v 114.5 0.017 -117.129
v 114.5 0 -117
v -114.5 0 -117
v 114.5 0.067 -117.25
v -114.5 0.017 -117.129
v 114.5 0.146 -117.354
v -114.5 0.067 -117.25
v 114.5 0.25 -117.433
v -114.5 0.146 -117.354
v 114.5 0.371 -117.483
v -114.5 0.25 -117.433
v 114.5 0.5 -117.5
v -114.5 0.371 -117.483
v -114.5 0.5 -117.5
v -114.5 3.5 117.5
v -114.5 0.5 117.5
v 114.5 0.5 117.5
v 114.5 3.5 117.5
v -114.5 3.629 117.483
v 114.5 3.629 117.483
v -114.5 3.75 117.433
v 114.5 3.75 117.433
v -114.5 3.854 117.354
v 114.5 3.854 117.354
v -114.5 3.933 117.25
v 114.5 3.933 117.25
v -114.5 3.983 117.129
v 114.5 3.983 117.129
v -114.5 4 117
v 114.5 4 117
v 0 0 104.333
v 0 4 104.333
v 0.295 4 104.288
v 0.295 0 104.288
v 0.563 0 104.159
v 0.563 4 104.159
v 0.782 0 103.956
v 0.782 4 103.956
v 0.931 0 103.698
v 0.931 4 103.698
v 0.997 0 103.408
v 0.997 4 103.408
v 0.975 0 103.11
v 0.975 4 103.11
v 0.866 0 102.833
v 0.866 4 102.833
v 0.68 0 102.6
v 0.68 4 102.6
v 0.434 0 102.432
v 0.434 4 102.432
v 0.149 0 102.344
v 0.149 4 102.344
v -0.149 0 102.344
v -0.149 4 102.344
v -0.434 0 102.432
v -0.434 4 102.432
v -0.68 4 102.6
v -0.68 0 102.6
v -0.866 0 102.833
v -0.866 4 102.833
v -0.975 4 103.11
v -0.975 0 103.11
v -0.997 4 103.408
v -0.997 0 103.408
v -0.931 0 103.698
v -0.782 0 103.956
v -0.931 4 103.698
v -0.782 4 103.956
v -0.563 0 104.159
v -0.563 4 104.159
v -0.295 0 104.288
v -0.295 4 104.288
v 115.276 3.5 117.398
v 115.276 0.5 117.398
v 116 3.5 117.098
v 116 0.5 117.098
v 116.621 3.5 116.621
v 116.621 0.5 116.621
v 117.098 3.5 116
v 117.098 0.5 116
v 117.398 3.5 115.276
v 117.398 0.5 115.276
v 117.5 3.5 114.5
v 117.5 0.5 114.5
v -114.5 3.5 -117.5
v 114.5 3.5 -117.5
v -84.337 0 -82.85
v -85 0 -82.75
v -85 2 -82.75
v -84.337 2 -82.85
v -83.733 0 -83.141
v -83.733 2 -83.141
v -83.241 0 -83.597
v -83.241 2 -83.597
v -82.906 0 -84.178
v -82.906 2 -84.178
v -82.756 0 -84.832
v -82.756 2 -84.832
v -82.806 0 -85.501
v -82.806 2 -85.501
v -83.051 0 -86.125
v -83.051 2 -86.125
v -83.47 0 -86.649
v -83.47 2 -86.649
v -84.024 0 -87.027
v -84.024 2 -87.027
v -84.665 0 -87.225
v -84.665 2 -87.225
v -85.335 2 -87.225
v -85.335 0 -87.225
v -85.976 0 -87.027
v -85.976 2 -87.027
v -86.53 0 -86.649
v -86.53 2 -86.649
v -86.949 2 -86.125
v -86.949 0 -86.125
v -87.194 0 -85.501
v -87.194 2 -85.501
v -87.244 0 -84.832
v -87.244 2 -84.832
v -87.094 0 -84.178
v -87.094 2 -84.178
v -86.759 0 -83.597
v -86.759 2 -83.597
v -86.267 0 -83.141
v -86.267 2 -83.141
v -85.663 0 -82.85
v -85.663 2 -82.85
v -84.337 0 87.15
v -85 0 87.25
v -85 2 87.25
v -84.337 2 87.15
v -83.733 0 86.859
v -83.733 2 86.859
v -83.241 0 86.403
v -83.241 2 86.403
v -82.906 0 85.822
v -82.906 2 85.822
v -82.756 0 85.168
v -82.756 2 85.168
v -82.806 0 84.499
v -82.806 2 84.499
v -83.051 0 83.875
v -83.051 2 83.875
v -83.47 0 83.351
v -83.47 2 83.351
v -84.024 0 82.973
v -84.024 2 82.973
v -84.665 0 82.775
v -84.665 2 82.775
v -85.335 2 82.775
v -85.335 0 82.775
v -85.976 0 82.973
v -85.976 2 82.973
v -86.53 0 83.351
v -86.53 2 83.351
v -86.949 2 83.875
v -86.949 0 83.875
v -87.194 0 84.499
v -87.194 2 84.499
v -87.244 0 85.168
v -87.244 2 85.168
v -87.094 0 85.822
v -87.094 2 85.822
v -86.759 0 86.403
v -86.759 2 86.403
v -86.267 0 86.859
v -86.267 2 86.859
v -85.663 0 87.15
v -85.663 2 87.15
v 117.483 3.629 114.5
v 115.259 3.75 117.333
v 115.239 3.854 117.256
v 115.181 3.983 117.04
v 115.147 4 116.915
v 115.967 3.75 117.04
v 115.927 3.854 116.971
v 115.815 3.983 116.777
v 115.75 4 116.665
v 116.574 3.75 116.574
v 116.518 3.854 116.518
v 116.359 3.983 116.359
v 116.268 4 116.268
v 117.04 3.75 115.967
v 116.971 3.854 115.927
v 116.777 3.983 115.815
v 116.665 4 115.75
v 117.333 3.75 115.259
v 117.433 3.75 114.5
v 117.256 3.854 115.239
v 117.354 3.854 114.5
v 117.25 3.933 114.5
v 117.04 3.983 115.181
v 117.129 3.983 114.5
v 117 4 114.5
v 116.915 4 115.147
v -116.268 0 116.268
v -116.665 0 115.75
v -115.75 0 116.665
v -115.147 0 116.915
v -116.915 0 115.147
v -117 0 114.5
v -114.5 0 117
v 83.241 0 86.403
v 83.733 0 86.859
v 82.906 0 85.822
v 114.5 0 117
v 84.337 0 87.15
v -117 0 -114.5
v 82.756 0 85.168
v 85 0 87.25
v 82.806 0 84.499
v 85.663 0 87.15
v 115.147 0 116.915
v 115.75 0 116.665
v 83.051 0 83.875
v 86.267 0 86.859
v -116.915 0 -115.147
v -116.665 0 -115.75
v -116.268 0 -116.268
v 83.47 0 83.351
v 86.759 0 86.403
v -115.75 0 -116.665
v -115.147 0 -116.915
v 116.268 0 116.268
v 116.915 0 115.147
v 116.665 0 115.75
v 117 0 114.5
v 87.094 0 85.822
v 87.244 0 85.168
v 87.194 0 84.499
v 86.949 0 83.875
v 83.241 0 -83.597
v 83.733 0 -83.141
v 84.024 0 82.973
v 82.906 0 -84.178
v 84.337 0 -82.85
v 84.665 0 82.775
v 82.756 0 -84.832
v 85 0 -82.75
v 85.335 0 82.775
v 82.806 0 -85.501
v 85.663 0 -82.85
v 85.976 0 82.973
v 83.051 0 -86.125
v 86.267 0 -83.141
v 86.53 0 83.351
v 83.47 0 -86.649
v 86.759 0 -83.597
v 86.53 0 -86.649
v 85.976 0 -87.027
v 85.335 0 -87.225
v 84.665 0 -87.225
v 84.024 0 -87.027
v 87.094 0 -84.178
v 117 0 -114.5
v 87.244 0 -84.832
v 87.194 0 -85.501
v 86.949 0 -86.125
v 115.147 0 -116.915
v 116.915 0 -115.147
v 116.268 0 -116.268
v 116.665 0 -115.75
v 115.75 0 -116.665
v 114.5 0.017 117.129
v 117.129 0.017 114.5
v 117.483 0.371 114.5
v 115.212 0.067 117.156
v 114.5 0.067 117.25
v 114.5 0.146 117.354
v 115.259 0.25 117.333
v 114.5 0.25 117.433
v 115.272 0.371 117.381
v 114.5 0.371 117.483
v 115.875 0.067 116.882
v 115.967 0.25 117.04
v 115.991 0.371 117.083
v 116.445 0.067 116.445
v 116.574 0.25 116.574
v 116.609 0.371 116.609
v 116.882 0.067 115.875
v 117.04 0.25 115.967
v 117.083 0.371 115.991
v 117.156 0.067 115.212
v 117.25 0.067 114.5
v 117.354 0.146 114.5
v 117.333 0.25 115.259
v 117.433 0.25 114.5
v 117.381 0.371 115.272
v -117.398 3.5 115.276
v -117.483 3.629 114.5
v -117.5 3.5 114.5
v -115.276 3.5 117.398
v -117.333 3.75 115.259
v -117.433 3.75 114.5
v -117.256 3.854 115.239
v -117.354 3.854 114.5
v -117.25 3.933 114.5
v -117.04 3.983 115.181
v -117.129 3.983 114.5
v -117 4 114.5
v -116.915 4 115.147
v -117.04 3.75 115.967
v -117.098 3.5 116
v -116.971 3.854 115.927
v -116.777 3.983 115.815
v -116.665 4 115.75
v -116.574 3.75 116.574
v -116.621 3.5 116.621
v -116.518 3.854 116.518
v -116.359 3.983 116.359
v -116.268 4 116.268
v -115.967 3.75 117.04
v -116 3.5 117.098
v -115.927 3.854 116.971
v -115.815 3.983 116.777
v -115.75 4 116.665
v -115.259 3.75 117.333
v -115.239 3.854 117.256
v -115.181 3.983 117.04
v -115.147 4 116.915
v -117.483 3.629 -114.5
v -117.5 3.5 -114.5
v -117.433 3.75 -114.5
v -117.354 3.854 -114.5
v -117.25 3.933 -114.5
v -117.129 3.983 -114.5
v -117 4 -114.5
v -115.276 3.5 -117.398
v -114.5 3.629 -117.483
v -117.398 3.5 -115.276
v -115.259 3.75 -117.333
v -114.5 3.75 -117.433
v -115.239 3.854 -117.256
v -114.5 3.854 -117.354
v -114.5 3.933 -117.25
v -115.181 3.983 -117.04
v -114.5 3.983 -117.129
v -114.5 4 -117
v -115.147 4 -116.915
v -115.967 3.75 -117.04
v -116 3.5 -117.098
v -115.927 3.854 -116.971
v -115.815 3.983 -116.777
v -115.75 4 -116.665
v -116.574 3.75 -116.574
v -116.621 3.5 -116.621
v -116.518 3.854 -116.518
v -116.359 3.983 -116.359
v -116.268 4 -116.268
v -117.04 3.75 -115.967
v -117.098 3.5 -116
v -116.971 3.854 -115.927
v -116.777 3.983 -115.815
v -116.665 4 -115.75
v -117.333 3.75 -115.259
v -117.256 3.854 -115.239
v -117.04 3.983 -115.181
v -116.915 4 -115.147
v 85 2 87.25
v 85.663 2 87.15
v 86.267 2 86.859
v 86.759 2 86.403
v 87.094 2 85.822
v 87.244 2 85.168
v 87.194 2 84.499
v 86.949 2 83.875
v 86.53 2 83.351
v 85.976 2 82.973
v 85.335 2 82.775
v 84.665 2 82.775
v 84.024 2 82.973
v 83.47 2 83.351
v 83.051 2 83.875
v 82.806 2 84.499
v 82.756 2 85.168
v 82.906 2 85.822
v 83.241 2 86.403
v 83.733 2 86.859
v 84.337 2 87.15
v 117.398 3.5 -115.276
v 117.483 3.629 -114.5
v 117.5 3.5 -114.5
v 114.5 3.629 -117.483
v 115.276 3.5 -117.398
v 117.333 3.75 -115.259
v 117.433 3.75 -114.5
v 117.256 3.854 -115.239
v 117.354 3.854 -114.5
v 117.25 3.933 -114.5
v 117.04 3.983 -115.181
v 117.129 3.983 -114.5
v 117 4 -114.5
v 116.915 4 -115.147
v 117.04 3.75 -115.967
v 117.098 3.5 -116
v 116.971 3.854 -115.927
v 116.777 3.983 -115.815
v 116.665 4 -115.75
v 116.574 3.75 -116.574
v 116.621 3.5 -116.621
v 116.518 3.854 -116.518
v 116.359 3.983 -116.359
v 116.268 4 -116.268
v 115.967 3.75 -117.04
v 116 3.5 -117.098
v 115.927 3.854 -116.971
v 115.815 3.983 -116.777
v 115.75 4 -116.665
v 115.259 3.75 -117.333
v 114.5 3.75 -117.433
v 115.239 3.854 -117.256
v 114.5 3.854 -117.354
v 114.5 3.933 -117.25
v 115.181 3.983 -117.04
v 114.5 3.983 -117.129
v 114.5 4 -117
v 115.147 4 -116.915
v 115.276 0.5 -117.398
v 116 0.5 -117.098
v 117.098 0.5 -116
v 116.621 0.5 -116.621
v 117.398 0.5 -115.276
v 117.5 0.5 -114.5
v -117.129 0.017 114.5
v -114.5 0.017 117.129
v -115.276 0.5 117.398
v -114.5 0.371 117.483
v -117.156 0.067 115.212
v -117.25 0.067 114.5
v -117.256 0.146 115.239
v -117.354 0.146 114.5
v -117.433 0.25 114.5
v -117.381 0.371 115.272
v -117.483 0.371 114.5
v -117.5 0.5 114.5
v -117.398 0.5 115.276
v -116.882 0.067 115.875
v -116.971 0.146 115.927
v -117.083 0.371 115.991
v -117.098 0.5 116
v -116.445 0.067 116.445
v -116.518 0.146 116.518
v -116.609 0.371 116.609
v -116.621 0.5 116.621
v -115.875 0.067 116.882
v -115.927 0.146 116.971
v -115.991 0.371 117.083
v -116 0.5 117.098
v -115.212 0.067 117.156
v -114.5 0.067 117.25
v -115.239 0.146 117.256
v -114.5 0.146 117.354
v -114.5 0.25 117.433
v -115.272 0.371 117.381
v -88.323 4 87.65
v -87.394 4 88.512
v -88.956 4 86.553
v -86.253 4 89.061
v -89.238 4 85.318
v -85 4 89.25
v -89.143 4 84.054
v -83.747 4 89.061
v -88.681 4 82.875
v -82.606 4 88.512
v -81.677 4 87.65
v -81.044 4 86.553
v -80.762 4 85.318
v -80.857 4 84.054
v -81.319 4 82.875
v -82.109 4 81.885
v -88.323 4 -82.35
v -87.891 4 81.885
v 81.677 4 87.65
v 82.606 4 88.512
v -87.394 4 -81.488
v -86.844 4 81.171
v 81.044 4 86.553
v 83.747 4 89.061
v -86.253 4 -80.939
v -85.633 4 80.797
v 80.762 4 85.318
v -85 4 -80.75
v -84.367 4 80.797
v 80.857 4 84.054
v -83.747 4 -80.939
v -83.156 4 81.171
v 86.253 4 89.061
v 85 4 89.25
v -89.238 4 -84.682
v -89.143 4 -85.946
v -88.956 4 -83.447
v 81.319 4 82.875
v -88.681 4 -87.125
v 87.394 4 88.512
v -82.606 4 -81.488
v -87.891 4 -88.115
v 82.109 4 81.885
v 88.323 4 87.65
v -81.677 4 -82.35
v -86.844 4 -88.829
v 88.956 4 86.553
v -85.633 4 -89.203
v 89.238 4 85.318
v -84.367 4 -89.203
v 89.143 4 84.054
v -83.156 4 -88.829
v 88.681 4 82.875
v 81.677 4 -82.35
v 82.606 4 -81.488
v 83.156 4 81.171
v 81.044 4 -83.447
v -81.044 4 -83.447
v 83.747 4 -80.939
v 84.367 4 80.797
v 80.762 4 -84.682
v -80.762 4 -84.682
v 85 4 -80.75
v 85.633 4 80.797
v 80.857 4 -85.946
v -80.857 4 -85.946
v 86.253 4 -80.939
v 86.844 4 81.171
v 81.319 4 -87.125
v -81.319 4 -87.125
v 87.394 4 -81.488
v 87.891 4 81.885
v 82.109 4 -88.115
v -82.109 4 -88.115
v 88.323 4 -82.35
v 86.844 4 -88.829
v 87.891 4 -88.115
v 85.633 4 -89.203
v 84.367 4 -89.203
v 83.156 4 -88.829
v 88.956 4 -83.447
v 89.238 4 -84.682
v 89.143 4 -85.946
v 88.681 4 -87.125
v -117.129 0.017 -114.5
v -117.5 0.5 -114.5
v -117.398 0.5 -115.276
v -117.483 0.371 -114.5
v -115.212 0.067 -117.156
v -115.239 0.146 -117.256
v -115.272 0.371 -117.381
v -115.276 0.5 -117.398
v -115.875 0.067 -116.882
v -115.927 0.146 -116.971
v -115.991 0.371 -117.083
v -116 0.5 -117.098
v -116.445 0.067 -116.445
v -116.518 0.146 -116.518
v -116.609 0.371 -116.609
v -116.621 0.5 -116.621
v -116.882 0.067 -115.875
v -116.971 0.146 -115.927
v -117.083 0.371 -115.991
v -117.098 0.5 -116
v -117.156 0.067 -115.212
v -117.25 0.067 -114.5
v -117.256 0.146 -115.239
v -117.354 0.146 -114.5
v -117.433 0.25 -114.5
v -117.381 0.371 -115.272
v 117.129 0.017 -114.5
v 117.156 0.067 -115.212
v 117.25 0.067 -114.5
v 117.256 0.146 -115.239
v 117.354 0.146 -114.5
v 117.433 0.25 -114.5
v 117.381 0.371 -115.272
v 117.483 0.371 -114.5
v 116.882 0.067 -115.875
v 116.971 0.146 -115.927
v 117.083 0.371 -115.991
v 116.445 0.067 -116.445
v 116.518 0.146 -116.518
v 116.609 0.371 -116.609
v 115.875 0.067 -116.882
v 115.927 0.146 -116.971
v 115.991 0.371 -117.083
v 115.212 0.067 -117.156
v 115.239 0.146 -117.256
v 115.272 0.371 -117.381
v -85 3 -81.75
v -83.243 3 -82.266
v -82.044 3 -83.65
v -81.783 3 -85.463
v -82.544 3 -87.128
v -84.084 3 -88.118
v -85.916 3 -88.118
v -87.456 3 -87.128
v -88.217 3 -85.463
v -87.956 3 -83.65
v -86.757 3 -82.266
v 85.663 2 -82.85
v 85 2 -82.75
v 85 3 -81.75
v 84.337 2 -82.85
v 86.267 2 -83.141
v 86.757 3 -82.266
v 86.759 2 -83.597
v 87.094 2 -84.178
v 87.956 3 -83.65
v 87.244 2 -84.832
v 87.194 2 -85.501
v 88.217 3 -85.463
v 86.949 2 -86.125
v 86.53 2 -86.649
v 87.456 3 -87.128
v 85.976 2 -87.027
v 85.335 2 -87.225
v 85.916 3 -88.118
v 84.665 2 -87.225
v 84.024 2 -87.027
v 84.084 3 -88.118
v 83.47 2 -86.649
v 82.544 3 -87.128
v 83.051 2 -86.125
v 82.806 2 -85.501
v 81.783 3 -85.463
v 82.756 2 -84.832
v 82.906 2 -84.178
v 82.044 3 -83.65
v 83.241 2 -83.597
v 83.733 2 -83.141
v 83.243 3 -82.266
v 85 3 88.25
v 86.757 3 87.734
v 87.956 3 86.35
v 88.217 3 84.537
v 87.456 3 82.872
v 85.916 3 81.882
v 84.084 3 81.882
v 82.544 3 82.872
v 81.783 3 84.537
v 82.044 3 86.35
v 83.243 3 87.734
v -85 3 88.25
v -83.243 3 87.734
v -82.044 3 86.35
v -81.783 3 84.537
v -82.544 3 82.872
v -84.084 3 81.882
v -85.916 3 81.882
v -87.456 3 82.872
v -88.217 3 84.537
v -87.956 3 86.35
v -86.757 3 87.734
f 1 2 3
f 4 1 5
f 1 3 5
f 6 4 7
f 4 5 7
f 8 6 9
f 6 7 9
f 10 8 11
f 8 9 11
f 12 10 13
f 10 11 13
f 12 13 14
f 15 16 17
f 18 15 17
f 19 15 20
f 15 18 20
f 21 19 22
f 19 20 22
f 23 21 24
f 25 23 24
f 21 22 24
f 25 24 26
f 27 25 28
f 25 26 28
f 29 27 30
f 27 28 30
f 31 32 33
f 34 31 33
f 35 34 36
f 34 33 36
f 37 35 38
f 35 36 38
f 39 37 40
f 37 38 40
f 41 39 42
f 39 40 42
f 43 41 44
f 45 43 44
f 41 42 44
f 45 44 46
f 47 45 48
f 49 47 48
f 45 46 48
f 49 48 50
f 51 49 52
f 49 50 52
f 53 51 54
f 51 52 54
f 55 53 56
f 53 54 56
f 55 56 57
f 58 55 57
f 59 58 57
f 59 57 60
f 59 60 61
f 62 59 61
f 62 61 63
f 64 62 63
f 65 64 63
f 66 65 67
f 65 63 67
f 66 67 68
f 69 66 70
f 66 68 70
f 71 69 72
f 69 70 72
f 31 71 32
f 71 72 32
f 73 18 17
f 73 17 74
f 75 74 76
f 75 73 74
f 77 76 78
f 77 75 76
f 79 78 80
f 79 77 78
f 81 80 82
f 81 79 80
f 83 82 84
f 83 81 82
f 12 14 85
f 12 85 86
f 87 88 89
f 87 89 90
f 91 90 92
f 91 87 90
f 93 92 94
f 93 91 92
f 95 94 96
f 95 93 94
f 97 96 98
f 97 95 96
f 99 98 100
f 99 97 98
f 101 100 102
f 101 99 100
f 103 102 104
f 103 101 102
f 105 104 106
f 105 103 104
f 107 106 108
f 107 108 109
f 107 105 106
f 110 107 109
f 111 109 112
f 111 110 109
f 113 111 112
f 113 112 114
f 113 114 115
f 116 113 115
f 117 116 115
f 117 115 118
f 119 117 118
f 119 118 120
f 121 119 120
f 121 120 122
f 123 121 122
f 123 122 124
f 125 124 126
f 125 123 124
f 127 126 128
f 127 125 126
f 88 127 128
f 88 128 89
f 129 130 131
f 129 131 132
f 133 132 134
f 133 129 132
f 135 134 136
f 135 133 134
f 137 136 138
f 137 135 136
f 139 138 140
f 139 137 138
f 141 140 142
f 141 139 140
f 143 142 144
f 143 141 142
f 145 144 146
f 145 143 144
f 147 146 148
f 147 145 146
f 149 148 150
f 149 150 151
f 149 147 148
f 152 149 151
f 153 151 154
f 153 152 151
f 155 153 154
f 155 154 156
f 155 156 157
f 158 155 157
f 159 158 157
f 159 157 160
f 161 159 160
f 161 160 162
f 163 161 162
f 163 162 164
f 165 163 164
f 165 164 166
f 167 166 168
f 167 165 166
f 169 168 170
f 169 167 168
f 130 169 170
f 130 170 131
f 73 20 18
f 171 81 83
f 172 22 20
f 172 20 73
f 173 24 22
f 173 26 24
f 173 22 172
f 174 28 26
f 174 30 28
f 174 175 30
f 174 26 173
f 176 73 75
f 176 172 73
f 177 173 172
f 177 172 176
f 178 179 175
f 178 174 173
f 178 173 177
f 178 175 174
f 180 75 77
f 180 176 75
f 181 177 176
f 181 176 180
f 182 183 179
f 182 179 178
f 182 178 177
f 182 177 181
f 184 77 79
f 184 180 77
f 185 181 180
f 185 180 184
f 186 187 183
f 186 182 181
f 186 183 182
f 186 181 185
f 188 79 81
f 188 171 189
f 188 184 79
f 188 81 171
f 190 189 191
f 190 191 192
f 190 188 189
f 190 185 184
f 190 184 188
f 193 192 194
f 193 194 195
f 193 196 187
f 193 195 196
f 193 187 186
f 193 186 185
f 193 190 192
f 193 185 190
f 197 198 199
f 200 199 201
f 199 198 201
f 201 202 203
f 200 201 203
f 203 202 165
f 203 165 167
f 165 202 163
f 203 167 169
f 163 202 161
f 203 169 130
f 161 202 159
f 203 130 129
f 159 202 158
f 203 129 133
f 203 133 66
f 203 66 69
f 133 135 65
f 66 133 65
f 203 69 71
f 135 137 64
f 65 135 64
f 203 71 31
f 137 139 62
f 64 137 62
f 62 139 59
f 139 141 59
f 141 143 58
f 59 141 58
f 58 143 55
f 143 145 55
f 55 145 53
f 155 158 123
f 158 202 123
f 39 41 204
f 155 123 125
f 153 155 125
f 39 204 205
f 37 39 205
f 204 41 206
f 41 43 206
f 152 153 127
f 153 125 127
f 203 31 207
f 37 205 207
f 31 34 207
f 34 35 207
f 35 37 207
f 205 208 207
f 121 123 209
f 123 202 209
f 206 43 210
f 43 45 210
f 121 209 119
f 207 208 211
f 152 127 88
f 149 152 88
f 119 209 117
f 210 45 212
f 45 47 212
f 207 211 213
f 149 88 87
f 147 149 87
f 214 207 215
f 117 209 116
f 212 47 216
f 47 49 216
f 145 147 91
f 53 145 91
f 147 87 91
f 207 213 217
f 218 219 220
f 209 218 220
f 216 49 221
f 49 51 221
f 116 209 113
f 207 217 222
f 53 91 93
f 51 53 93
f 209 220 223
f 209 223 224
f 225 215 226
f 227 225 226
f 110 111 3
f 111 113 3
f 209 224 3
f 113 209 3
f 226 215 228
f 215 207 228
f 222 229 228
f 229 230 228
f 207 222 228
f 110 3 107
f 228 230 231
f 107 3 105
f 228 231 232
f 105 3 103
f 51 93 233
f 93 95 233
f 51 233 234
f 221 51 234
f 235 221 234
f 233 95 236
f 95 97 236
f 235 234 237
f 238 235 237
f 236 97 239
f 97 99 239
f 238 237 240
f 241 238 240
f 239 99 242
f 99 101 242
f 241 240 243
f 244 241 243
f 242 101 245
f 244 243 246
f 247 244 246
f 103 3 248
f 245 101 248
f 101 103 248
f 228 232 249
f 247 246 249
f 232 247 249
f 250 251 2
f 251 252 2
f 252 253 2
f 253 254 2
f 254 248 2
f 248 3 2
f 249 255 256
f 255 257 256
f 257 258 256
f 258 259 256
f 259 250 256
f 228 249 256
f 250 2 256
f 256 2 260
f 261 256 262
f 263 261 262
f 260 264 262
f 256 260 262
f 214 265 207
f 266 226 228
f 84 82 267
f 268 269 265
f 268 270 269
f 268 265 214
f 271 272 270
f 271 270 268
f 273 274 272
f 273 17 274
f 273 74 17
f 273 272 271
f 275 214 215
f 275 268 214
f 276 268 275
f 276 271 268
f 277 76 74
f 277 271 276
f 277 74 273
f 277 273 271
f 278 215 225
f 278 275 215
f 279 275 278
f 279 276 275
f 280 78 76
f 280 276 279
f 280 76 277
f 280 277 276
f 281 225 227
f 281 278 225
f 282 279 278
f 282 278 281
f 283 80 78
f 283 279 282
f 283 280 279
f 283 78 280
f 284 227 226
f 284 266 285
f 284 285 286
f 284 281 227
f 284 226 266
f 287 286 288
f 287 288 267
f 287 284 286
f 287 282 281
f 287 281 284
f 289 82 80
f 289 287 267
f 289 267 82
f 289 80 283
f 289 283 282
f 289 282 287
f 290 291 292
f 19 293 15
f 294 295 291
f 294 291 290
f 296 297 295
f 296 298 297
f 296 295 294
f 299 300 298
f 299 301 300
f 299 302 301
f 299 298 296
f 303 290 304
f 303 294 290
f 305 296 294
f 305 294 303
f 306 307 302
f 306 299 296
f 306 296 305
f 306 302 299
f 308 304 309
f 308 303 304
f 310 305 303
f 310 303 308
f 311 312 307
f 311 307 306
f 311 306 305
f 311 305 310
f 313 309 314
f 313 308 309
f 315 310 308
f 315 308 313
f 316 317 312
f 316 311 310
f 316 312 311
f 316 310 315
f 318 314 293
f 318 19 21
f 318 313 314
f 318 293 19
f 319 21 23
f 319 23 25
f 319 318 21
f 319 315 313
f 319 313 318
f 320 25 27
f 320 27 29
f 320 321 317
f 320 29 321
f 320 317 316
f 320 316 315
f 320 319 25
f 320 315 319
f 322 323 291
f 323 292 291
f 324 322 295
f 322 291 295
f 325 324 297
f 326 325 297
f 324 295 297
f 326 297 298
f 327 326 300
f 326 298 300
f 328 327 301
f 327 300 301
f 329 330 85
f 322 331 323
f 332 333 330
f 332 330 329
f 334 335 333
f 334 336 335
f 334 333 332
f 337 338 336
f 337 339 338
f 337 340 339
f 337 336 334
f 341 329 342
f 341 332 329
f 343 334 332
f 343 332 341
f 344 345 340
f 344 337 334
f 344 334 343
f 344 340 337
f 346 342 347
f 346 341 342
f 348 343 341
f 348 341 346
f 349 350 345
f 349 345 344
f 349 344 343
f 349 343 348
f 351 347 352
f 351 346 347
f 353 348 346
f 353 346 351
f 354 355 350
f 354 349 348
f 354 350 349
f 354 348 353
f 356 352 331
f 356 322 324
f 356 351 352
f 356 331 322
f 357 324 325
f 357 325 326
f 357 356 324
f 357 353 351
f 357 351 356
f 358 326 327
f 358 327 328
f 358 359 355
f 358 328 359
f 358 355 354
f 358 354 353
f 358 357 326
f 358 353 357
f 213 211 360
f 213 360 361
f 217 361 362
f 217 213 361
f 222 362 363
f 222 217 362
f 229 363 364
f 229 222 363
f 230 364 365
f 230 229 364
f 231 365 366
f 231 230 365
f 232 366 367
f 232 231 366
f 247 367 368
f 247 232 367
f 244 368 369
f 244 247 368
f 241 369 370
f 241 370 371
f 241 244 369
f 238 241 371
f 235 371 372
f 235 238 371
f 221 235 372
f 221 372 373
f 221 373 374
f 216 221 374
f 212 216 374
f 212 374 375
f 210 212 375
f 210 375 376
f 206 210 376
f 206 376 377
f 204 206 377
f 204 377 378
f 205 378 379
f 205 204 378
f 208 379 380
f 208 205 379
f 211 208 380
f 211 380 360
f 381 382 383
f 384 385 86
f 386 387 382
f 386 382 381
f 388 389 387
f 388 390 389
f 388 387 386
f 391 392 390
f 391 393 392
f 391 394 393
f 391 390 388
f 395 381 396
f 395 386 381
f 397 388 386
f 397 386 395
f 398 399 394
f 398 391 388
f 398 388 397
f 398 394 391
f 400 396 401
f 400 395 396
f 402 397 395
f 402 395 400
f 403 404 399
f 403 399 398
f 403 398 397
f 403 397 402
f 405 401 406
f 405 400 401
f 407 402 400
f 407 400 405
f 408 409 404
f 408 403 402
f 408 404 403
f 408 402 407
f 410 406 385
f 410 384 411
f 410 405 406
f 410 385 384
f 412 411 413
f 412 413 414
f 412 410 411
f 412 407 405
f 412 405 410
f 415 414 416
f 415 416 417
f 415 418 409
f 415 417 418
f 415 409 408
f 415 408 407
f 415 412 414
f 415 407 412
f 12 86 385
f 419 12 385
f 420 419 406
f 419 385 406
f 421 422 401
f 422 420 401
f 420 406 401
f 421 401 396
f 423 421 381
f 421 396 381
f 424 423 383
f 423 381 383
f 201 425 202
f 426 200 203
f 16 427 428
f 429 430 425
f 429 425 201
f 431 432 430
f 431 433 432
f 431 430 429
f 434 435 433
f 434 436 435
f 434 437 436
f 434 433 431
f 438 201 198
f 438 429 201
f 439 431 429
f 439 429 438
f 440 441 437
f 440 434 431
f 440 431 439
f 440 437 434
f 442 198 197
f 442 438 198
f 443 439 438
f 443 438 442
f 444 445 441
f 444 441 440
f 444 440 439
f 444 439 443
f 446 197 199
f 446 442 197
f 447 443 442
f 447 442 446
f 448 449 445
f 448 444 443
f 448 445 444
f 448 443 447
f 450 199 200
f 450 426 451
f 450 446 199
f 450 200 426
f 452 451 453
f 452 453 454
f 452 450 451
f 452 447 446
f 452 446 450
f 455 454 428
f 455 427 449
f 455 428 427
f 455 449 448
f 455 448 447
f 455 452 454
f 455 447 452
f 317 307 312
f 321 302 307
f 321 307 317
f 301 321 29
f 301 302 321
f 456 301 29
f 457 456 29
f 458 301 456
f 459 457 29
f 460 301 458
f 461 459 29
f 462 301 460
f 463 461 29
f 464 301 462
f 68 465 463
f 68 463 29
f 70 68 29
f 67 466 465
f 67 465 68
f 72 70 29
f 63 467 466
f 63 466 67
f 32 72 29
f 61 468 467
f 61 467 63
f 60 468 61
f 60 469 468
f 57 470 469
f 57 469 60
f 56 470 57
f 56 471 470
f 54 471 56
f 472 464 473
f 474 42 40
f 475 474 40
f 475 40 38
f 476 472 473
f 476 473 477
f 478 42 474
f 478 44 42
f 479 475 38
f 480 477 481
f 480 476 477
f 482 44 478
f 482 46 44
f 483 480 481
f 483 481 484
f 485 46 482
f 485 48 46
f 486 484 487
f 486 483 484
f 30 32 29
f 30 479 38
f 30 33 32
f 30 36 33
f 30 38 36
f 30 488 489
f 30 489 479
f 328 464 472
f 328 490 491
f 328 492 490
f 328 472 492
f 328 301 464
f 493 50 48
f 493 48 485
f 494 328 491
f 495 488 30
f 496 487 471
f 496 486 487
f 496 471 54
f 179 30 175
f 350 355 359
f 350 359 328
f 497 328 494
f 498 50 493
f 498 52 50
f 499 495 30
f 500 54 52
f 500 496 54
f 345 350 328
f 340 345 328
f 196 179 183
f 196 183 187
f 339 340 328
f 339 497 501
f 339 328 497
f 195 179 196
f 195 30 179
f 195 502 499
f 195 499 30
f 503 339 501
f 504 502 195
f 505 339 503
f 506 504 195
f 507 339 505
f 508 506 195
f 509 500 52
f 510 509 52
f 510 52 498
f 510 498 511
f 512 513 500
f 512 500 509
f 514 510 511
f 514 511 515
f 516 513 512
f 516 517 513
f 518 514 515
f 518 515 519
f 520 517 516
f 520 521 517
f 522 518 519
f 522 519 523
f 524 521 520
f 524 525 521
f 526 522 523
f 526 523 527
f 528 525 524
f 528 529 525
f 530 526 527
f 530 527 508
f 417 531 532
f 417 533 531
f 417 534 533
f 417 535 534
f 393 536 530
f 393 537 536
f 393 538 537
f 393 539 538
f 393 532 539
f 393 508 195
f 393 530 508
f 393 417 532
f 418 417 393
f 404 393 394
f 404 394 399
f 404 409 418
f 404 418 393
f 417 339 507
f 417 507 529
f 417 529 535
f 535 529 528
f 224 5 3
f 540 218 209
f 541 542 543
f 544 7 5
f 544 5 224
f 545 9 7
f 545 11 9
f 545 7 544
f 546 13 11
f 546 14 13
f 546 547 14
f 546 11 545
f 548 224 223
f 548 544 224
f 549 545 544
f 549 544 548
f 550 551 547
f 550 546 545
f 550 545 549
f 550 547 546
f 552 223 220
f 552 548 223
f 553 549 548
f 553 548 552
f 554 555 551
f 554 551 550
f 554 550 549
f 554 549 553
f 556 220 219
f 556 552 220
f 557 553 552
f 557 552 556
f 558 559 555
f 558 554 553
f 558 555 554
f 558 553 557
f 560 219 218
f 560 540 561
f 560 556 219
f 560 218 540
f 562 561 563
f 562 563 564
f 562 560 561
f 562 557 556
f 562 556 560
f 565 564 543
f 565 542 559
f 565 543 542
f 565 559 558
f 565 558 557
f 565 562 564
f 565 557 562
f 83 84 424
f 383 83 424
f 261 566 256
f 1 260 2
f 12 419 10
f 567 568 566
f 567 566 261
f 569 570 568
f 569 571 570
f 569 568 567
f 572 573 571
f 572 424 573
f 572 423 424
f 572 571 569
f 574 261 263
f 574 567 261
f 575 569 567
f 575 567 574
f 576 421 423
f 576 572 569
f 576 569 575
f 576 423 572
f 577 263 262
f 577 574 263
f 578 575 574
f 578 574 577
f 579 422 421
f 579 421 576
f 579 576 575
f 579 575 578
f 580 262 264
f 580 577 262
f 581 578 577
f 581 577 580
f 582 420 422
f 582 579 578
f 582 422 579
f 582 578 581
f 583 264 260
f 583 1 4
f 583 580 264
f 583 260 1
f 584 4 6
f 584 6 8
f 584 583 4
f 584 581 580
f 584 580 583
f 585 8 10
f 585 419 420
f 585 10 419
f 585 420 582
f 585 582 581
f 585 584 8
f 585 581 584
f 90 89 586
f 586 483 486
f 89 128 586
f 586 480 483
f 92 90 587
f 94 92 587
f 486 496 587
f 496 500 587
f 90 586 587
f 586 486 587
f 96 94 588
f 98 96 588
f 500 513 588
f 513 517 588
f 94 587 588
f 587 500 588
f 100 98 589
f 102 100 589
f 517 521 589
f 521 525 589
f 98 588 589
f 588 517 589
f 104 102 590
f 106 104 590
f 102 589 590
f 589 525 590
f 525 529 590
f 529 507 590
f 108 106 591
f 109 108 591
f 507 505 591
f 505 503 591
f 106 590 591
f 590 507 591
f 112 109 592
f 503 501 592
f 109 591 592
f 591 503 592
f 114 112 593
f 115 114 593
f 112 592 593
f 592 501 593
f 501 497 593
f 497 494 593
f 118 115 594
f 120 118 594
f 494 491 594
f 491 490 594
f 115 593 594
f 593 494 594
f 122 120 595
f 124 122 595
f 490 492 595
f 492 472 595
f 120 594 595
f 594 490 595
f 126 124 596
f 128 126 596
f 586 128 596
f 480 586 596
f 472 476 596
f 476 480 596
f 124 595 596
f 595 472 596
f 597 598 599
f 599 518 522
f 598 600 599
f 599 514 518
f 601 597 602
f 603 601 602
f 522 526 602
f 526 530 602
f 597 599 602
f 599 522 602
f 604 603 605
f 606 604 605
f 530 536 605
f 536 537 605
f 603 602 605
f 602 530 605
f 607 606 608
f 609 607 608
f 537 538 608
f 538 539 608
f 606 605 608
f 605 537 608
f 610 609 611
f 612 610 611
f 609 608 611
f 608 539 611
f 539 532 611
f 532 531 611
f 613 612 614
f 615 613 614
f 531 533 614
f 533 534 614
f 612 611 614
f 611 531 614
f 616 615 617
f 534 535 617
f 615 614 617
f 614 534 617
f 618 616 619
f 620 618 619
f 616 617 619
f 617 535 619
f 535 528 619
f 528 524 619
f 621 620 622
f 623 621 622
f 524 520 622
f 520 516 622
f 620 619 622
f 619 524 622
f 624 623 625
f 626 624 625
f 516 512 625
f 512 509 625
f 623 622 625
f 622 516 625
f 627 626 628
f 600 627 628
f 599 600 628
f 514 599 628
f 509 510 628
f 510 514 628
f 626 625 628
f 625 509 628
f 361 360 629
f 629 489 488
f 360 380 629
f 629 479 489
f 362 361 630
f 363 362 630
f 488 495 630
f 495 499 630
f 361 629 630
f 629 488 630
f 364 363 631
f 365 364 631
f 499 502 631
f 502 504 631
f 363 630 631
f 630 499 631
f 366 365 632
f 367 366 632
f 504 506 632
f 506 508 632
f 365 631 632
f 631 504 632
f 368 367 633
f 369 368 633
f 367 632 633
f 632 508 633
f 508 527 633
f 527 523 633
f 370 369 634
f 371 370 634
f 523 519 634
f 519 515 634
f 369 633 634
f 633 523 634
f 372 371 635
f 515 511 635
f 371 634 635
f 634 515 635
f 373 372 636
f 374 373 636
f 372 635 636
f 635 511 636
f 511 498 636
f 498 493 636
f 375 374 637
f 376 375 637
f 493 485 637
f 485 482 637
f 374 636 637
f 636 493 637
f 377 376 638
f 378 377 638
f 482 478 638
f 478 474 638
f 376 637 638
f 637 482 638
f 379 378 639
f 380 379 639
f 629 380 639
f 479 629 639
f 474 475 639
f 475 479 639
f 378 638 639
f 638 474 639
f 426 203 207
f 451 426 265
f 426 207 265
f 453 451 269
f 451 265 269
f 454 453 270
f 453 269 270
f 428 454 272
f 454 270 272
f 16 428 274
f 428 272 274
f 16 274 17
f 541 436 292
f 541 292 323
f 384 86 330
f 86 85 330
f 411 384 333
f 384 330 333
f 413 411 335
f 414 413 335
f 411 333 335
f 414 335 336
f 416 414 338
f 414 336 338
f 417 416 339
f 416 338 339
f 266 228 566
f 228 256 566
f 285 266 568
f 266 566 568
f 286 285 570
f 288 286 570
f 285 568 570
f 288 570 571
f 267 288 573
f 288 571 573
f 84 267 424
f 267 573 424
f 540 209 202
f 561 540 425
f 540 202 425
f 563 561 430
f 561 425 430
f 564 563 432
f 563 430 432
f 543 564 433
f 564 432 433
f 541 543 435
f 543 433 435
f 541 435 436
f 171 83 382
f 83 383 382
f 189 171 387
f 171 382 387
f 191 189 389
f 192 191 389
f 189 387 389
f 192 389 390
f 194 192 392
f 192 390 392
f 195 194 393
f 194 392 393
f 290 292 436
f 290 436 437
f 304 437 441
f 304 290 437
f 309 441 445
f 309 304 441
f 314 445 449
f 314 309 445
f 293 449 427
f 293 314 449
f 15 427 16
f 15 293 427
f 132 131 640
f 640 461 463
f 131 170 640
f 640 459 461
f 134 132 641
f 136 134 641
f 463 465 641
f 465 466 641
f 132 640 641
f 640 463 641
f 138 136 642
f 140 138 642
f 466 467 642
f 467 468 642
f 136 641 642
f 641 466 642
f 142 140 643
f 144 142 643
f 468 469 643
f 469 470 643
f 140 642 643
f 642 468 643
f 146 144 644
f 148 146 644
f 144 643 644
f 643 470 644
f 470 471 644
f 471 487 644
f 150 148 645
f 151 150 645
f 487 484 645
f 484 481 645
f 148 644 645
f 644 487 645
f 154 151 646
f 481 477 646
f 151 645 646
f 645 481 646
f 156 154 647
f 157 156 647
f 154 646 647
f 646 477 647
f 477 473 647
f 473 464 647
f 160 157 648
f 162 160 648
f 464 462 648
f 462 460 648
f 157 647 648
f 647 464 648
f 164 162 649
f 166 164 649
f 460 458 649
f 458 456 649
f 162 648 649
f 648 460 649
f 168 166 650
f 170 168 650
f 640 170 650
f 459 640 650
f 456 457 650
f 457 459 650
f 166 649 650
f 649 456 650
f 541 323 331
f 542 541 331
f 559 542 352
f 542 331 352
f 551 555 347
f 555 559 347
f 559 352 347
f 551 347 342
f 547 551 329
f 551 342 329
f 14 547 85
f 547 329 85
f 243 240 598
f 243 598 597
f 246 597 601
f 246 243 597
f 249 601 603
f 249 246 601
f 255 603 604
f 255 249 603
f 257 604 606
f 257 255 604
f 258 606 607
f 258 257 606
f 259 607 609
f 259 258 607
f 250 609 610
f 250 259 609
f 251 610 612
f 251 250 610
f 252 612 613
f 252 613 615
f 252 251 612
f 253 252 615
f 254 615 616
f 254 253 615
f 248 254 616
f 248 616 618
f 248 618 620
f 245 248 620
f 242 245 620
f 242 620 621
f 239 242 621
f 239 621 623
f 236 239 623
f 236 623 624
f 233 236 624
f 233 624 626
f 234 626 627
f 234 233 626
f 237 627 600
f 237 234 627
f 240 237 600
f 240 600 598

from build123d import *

# Parameters (mm, degrees)
SKETCH1_W           = 235
SKETCH1_H           = 235
SKETCH1_R           = 2.25
BOSS_EXTRUDE1_DEPTH = 4
CHAMFER1_SIZE       = 2
FILLET1_R           = 3
FILLET2_R           = 0.5
SKETCH2_R           = 1
CUT_EXTRUDE1_DEPTH  = 4


with BuildPart() as part:
    # Sketch1 → Boss-Extrude1 (new body)
    with BuildSketch(Plane(origin=(0, 0, 0), x_dir=(1, 0, 0), z_dir=(0, 1, 0))):
        Rectangle(SKETCH1_W, SKETCH1_H)
        with Locations(Location((85, 85, 0), (0, 0, 270))):
            Circle(SKETCH1_R, mode=Mode.SUBTRACT)
        with Locations(Location((-85, 85, 0), (0, 0, 270))):
            Circle(SKETCH1_R, mode=Mode.SUBTRACT)
        with Locations(Location((-85, -85, 0), (0, 0, 270))):
            Circle(SKETCH1_R, mode=Mode.SUBTRACT)
        with Locations(Location((85, -85, 0), (0, 0, 270))):
            Circle(SKETCH1_R, mode=Mode.SUBTRACT)
    extrude(amount=BOSS_EXTRUDE1_DEPTH)

    # Chamfer1
    chamfer1_edges = [part.edges().sort_by_distance(p)[0] for p in [
        (85, 4, -87.25),
        (-85, 4, -87.25),
        (-85, 4, 82.75),
        (85, 4, 82.75),
    ]]
    chamfer(chamfer1_edges, length=CHAMFER1_SIZE)

    # Fillet1
    fillet1_edges = [part.edges().sort_by_distance(p)[0] for p in [
        (117.5, 2, 117.5),
        (-117.5, 2, 117.5),
        (-117.5, 2, -117.5),
        (117.5, 2, -117.5),
    ]]
    fillet(fillet1_edges, radius=FILLET1_R)

    # Fillet2
    fillet2_edges = [part.edges().sort_by_distance(p)[0] for p in [
        (117.5, 0, 0),
        (117.5, 4, 0),
        (0, 0, 117.5),
        (-117.5, 0, 0),
        (0, 0, -117.5),
        (116.621320344, 0, -116.621320344),
        (-116.621320344, 0, -116.621320344),
        (-116.621320344, 0, 116.621320344),
        (116.621320344, 0, 116.621320344),
        (0, 4, 117.5),
        (0, 4, -117.5),
        (-117.5, 4, 0),
        (116.621320344, 4, -116.621320344),
        (-116.621320344, 4, -116.621320344),
        (-116.621320344, 4, 116.621320344),
        (116.621320344, 4, 116.621320344),
    ]]
    fillet(fillet2_edges, radius=FILLET2_R)

    # Sketch2 → Cut-Extrude1 (cut)
    with BuildSketch(Plane(origin=(0, 4, 0), x_dir=(1, 0, 0), z_dir=(0, 1, 0))):
        with Locations(Location((0, -103.332788309, 0), (0, 0, 270))):
            Circle(SKETCH2_R)
    extrude(amount=-CUT_EXTRUDE1_DEPTH, mode=Mode.SUBTRACT)


solid = part.part
